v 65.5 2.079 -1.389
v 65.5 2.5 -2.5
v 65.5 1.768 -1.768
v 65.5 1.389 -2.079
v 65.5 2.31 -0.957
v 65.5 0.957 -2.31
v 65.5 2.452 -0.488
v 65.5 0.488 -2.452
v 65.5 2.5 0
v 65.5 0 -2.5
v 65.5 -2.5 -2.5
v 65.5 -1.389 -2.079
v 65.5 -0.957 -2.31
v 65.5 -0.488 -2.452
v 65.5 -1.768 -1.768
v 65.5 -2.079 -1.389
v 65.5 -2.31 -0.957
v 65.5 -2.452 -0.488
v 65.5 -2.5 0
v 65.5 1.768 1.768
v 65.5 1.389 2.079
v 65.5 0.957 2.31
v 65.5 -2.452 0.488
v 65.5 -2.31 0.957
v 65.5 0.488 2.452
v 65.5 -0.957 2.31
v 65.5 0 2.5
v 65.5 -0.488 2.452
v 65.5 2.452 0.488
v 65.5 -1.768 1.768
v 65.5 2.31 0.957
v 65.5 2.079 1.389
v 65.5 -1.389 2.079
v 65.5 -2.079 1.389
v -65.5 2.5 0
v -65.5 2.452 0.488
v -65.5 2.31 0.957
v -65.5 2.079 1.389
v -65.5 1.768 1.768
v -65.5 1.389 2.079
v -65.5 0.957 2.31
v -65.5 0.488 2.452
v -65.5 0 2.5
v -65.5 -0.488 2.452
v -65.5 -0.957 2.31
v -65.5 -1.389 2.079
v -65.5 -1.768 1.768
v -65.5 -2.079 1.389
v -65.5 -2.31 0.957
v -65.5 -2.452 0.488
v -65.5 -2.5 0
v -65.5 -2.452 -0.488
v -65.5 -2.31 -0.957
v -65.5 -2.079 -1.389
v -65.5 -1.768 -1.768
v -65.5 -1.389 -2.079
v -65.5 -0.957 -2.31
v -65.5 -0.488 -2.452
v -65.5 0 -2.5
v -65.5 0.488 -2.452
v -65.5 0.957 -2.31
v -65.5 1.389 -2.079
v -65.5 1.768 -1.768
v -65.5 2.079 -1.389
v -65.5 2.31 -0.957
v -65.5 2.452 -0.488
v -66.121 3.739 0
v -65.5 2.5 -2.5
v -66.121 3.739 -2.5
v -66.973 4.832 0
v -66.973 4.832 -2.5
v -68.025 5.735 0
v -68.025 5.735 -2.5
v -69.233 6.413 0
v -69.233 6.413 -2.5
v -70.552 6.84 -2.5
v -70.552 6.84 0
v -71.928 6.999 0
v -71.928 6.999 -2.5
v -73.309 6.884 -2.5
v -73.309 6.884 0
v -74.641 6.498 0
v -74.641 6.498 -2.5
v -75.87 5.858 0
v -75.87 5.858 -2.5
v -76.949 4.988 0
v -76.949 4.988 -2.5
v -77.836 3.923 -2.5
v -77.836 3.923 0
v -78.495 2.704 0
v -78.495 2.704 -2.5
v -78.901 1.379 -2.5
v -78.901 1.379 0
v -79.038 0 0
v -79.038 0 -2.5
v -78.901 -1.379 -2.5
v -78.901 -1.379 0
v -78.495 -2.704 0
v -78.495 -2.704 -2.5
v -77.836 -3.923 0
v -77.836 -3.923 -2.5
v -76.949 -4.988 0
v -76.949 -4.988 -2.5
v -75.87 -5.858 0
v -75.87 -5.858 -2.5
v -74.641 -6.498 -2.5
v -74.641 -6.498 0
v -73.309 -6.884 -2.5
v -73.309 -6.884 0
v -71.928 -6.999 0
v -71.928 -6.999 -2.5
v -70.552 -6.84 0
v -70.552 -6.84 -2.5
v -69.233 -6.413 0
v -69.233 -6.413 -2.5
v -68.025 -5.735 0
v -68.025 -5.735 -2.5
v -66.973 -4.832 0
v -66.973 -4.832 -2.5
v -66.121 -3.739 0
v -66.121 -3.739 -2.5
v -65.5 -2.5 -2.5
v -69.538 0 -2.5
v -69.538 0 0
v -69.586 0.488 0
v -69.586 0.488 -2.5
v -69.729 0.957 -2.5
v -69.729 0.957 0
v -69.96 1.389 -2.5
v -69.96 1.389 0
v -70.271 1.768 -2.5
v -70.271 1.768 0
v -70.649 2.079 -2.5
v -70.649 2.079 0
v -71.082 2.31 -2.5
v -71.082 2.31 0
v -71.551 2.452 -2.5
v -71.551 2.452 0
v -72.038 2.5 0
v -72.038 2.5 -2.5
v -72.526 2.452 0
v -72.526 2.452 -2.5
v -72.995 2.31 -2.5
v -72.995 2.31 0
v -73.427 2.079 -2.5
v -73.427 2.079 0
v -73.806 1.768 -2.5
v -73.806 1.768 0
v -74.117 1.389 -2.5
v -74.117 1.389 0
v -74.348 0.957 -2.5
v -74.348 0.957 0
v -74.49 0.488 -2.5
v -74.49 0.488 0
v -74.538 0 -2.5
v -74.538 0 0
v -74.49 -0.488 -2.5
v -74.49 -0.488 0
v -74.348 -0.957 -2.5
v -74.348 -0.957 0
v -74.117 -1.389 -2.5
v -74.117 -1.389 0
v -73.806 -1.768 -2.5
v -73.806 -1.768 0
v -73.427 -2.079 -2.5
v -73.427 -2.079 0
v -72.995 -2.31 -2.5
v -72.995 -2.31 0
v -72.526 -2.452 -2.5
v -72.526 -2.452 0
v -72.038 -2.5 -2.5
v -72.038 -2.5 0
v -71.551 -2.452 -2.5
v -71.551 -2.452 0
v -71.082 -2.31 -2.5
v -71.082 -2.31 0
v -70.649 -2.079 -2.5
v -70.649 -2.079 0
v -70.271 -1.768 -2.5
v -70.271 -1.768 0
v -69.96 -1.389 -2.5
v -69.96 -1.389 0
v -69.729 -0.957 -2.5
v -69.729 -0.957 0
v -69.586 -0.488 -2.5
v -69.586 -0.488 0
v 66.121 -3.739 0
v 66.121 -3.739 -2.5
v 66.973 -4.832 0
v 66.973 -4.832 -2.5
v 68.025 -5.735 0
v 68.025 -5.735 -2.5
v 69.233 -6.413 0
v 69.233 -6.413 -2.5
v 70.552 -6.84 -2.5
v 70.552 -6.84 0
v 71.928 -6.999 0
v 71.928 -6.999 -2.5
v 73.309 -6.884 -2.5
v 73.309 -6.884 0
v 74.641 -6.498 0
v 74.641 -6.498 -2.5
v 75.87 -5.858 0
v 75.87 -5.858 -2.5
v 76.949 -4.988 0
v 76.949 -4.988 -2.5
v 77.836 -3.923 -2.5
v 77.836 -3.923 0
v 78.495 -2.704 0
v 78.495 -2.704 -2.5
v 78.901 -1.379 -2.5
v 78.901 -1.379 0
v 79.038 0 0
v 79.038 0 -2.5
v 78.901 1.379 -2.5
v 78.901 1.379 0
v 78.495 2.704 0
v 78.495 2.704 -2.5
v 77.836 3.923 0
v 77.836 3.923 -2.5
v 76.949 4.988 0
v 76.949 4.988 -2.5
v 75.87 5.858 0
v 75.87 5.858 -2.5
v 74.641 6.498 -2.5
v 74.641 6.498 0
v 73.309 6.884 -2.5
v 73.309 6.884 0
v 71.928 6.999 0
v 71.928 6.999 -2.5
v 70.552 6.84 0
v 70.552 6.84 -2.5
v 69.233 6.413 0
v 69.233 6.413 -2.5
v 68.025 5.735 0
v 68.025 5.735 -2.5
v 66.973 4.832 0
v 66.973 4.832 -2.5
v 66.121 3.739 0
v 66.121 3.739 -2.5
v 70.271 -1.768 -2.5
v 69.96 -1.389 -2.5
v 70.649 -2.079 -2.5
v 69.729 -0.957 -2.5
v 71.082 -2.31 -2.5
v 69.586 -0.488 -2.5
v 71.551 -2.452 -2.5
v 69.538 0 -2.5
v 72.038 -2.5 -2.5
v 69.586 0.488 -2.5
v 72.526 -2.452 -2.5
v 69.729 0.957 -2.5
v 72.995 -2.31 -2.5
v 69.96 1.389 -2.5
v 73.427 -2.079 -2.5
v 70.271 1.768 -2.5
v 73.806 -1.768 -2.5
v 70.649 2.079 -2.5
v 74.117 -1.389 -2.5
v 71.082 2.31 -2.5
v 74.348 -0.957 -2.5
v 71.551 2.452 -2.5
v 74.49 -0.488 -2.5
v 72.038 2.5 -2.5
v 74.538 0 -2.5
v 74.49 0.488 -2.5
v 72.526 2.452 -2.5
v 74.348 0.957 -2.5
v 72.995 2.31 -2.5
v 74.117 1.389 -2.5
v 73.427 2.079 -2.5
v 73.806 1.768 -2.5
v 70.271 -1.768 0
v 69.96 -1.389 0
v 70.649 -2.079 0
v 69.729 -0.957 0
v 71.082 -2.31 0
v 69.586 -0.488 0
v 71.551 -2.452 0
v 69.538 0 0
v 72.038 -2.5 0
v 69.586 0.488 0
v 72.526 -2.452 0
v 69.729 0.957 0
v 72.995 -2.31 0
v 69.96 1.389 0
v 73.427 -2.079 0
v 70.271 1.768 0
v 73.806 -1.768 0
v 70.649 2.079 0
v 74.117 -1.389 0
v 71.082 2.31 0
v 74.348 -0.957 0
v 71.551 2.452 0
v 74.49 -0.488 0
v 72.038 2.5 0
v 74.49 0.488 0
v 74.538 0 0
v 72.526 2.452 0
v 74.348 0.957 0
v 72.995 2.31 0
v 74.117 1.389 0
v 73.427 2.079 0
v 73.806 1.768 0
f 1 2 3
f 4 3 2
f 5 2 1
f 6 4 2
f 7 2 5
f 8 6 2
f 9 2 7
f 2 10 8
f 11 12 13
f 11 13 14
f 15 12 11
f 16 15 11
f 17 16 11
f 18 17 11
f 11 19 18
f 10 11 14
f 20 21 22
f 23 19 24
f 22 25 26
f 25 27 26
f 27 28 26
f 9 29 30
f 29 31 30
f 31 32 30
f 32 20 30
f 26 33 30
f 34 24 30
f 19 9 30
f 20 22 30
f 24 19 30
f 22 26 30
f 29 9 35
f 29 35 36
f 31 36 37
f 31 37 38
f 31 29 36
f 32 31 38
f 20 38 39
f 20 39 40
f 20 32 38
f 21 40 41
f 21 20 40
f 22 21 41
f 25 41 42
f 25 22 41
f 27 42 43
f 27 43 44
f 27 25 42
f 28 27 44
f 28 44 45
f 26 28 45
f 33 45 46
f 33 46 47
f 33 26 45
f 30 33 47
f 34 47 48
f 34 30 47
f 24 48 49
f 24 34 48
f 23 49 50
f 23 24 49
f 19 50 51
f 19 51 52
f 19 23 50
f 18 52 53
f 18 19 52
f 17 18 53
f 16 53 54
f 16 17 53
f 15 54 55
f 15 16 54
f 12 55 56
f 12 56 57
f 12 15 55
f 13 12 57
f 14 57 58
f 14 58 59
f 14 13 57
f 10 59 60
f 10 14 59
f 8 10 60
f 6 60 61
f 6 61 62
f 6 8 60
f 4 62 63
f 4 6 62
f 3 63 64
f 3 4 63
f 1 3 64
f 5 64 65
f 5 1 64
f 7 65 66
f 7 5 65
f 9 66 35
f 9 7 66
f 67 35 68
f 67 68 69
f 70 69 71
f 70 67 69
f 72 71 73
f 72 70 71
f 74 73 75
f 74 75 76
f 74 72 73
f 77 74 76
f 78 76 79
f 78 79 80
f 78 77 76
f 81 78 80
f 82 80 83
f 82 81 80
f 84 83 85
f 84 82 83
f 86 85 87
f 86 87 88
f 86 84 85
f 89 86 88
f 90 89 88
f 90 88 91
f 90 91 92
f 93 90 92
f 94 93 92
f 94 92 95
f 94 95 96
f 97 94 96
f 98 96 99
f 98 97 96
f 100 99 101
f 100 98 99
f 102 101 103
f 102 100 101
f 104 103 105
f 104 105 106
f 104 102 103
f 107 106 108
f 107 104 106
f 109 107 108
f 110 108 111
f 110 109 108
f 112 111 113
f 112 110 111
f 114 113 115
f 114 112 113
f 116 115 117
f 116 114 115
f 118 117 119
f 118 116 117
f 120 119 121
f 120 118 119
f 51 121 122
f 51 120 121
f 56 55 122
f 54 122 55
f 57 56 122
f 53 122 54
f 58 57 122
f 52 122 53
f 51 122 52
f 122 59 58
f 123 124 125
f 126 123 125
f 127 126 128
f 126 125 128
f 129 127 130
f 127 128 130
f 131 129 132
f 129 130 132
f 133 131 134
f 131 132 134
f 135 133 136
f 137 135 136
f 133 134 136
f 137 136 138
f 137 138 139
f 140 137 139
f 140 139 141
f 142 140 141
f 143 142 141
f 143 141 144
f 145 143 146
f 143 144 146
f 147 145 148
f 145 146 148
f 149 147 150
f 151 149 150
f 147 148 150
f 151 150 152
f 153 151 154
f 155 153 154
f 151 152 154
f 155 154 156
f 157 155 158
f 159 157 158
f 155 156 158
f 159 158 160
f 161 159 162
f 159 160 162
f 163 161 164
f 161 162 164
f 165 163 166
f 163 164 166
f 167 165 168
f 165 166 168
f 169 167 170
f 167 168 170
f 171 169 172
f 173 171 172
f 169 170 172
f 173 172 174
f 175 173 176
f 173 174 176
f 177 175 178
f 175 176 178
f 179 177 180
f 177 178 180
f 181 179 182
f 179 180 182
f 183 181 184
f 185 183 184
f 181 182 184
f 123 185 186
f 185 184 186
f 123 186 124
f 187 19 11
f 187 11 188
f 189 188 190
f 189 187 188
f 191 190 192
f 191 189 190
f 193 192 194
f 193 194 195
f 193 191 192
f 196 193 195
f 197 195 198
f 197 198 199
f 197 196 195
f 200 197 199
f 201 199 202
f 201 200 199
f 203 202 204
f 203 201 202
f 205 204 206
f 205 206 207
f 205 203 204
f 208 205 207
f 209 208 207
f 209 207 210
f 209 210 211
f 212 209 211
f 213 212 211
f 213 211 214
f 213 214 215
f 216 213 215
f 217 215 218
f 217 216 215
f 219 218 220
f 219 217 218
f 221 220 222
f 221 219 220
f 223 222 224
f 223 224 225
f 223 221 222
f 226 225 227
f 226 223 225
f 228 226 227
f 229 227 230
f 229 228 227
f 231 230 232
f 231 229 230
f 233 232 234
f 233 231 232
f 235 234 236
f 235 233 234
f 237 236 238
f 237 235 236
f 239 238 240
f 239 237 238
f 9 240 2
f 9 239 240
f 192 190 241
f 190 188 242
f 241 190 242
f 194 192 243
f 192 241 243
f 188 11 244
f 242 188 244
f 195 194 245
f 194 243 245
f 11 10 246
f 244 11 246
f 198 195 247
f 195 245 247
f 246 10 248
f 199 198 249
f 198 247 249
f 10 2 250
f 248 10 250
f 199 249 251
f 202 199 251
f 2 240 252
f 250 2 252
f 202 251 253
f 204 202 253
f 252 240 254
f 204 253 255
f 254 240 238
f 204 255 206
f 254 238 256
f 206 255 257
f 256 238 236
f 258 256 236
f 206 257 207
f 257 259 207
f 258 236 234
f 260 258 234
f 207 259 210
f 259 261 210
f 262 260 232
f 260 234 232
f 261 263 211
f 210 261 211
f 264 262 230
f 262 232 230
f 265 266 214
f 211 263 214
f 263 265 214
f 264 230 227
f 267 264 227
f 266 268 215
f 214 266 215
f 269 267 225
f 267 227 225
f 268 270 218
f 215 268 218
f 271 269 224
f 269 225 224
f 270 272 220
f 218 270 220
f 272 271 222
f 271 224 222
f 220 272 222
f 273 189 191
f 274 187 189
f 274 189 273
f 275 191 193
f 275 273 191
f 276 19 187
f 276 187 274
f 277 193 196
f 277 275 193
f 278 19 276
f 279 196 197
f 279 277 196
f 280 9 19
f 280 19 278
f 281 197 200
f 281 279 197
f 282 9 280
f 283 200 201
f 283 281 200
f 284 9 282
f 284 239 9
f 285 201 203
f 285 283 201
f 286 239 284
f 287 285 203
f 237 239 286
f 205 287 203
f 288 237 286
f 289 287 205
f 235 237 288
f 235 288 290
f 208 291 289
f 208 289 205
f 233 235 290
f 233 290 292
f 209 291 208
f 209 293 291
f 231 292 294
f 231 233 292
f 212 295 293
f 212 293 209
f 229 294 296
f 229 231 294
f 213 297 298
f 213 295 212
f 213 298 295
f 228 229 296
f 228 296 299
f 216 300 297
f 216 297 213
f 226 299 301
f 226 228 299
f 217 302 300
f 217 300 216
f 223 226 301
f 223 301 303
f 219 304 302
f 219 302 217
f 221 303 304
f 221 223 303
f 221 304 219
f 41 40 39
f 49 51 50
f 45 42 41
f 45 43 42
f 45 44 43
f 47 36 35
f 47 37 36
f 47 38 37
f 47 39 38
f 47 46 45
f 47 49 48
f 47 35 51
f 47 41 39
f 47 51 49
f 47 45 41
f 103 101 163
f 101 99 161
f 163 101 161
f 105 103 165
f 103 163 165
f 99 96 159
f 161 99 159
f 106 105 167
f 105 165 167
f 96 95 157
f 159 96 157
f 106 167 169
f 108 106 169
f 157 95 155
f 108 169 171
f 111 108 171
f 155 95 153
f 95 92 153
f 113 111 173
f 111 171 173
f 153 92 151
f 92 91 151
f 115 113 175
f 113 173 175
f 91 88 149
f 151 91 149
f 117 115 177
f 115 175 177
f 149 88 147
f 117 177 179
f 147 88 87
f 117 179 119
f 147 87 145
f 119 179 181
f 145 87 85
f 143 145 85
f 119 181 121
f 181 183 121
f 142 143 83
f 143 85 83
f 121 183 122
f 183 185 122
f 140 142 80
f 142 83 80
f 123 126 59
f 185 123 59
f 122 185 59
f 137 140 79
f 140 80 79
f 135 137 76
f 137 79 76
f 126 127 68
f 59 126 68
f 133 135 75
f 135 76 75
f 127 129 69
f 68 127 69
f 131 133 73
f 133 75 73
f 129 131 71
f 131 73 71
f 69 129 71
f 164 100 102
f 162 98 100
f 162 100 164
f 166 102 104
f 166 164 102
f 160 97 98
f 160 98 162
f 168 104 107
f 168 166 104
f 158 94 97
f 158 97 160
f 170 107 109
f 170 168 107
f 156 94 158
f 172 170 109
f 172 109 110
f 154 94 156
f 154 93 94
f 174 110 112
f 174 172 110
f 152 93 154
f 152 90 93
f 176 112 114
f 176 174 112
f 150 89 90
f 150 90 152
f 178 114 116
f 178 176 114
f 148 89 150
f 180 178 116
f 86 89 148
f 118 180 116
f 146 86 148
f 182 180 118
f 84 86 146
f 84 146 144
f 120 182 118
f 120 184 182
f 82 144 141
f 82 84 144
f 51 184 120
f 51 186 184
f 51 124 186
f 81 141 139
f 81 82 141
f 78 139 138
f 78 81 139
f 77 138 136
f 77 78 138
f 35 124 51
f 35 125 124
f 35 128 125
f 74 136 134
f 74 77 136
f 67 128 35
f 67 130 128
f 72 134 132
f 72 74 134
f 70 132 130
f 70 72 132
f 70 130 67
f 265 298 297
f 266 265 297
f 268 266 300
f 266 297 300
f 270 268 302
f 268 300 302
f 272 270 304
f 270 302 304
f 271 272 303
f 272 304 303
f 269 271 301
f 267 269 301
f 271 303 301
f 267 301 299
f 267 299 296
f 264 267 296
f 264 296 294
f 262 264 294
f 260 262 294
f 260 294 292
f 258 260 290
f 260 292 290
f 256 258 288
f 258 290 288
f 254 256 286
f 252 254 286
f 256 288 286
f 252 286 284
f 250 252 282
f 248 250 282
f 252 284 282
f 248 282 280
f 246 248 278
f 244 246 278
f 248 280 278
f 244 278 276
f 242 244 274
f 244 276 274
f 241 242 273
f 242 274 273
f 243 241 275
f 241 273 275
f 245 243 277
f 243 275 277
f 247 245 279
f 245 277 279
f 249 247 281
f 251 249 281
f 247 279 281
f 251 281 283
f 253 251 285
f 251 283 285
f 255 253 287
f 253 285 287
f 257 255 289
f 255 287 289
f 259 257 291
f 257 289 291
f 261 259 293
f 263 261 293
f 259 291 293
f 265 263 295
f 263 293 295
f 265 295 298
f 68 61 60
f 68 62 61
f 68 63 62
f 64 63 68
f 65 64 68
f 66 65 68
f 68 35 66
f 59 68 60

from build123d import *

# Parameters (mm, degrees)
SKETCH1_W           = 131
SKETCH1_H           = 2.5
SKETCH3_R           = 2.5
BOSS_EXTRUDE2_DEPTH = 2.5


with BuildPart() as part:
    # Sketch1 → Revolve-Thin1 (revolve)
    with BuildSketch(Plane.XY):
        with Locations((0, 1.25)):
            Rectangle(SKETCH1_W, SKETCH1_H)
    revolve(axis=Axis((-65.5, 0, 0), (1, 0, 0)))

    # Sketch3 → Boss-Extrude2 (add)
    with BuildSketch(Plane.XY):
        with BuildLine():
            Line((65.5, 2.5), (65.5, -2.5))
            ThreePointArc((65.5, -2.5), (79.038348415, 0), (65.5, 2.5))
        make_face()
        with Locations((72.038348415, 0)):
            Circle(SKETCH3_R, mode=Mode.SUBTRACT)
        with BuildLine():
            Line((-65.5, -2.5), (-65.5, 2.5))
            ThreePointArc((-65.5, 2.5), (-79.038348415, 0), (-65.5, -2.5))
        make_face()
        with Locations((-72.038348415, 0)):
            Circle(SKETCH3_R, mode=Mode.SUBTRACT)
    extrude(amount=-BOSS_EXTRUDE2_DEPTH)


solid = part.part
